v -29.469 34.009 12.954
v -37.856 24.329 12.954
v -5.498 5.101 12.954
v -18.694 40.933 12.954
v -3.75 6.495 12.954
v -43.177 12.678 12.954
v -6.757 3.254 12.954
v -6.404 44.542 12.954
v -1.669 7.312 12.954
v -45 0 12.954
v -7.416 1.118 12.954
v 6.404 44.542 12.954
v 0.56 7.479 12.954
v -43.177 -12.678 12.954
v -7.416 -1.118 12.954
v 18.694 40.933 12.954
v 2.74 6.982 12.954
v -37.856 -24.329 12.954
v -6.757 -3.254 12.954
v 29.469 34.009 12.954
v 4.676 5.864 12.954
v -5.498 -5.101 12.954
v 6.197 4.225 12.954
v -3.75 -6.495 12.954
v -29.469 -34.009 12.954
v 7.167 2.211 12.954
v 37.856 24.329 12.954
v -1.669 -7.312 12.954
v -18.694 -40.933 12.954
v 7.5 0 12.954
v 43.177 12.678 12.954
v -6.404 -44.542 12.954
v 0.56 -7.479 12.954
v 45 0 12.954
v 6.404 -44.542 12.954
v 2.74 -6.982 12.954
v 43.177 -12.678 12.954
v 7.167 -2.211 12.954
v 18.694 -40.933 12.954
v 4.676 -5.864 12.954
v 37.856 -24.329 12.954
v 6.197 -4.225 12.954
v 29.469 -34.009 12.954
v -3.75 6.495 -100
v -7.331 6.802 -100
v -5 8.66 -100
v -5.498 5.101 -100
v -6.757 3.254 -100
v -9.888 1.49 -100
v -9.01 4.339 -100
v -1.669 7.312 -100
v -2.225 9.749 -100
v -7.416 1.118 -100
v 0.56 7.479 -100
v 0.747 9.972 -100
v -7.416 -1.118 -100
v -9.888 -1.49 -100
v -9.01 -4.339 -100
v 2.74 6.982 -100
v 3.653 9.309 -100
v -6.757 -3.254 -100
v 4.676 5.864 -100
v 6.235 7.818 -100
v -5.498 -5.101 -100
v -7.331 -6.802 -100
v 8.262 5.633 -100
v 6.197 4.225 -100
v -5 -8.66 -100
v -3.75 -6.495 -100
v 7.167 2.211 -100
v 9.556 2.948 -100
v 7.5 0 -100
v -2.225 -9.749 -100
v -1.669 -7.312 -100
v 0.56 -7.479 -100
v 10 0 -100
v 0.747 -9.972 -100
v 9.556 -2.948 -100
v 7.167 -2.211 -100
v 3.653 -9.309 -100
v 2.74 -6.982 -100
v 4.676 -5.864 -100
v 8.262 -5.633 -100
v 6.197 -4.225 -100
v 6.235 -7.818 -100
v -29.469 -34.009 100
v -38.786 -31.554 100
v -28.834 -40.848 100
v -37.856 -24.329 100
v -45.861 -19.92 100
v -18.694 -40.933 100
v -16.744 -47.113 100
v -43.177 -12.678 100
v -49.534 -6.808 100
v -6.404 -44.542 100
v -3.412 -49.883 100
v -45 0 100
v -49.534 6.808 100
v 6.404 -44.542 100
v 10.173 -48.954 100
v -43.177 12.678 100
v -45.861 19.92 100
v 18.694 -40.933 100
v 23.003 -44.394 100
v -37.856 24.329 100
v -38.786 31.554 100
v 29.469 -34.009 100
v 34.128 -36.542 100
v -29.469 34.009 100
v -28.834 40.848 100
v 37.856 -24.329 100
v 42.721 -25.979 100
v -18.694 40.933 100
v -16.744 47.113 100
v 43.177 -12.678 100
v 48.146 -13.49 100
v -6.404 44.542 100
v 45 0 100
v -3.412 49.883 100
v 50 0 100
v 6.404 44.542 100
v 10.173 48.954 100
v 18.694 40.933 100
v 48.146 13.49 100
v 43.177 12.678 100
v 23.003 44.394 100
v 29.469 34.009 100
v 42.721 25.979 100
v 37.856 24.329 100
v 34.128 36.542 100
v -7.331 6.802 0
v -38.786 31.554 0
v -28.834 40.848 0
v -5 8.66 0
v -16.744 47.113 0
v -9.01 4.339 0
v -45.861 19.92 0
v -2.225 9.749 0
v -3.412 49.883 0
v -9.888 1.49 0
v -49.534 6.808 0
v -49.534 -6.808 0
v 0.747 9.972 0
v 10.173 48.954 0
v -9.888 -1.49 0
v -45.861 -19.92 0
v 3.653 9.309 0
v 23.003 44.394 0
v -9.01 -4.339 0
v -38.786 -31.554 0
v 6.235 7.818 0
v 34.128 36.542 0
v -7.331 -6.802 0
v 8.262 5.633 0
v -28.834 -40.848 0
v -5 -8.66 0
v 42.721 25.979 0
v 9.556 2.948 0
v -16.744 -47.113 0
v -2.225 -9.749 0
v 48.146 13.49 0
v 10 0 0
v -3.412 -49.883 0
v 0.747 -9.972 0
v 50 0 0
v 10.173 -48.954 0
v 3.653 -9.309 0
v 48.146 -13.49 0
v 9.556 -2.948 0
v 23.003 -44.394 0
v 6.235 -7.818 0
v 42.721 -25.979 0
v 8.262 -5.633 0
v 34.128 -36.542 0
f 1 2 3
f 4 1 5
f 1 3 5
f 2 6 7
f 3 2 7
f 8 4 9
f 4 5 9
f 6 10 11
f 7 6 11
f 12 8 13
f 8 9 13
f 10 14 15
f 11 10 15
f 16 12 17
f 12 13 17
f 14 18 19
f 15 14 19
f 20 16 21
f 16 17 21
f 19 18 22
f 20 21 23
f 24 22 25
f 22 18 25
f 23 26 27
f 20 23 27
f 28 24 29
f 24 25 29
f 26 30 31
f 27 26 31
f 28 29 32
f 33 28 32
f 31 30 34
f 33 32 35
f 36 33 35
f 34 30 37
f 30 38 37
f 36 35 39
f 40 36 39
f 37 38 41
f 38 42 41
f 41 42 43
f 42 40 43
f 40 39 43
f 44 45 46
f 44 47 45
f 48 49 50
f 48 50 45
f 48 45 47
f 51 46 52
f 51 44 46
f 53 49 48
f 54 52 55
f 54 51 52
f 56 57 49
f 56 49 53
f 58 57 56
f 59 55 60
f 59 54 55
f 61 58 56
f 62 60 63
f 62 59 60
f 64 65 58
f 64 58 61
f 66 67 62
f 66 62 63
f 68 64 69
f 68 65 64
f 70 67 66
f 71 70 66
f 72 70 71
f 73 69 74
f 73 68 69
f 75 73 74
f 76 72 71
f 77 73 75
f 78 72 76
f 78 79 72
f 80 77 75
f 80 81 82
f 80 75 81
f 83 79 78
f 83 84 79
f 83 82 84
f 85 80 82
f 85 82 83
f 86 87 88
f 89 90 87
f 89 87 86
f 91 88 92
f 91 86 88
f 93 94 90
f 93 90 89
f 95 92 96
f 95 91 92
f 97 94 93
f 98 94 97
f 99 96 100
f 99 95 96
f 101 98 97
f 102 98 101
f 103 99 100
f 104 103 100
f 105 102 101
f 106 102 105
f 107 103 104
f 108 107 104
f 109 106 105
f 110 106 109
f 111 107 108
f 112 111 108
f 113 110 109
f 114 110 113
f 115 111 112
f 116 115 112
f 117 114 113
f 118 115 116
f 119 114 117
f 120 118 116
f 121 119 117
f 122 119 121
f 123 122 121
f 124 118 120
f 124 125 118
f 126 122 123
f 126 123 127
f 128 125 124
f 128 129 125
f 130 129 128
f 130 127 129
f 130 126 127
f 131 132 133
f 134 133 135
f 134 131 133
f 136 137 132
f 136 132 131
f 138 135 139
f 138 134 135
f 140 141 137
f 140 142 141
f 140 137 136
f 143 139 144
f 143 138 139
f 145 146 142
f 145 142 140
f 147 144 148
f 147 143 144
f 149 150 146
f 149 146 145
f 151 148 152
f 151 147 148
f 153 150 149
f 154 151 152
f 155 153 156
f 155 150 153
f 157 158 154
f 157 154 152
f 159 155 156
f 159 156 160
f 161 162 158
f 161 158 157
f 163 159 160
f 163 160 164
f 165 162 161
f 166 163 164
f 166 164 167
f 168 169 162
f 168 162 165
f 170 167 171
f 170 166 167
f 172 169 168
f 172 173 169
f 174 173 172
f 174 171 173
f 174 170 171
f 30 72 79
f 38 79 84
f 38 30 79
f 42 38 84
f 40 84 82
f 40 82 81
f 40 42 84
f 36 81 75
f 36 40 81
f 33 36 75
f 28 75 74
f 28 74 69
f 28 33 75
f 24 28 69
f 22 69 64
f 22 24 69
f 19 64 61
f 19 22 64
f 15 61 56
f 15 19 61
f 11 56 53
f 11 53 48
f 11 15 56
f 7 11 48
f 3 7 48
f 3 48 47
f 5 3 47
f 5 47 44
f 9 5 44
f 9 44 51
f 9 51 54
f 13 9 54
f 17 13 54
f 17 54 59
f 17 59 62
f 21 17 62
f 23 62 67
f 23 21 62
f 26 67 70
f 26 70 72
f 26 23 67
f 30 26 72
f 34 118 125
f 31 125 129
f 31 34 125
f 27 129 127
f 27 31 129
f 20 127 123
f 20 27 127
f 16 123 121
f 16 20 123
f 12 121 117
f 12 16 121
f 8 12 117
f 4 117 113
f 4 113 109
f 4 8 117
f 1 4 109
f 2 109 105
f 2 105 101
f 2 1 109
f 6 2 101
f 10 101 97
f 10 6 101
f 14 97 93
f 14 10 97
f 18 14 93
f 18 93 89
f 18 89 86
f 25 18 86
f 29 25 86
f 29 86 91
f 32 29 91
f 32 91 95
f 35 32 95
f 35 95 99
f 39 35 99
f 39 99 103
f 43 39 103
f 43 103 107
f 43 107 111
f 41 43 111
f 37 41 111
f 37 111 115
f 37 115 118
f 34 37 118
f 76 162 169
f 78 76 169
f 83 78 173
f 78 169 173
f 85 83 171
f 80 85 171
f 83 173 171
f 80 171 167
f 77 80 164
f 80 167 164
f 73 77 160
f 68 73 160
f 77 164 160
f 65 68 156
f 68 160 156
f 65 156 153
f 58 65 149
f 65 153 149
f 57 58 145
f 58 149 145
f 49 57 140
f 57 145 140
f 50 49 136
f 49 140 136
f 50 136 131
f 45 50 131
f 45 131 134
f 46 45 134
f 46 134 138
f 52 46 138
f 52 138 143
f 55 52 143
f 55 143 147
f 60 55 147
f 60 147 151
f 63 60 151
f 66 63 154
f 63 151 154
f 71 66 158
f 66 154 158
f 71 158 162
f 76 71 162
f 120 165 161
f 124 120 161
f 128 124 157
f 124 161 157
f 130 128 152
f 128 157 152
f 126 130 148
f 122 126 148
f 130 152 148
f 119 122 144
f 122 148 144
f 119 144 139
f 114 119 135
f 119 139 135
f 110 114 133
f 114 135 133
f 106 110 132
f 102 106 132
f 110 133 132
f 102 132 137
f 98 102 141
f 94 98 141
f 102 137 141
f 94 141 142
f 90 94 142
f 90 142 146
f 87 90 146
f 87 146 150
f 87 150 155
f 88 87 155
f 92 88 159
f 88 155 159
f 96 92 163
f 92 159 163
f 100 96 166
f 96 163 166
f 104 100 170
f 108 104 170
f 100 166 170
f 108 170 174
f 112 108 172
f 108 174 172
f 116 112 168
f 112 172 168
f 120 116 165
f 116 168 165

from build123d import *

# Parameters (mm, degrees)
F0_R     = 50
F0_R_2   = 45
F1_DEPTH = 100
F2_R     = 45
F3_DEPTH = 12.954
F4_R     = 7.5
F5_DEPTH = 12.954
F6_R     = 10
F6_R_2   = 7.5
F7_DEPTH = 100


with BuildPart() as f1:
    # F0 (on Top) → F1 (new body)
    with BuildSketch(Plane.XY):
        Circle(F0_R)
        Circle(F0_R_2, mode=Mode.SUBTRACT)
    extrude(amount=F1_DEPTH)

    # F2 (on face) → F3 (join)
    with BuildSketch(Plane(origin=(0, 0, 0), x_dir=(1, 0, 0), z_dir=(0, 0, -1))):
        Circle(F2_R)
    extrude(amount=-F3_DEPTH)

    # F4 (on face) → F5 (cut, through all)
    with BuildSketch(Plane(origin=(0, 0, 0), x_dir=(1, 0, 0), z_dir=(0, 0, -1))):
        Circle(F4_R)
    extrude(amount=-F5_DEPTH, mode=Mode.SUBTRACT)

    # F6 (on face) → F7 (join)
    with BuildSketch(Plane(origin=(0, 0, 0), x_dir=(1, 0, 0), z_dir=(0, 0, -1))):
        Circle(F6_R)
        Circle(F6_R_2, mode=Mode.SUBTRACT)
    extrude(amount=F7_DEPTH)


solid = f1.part
